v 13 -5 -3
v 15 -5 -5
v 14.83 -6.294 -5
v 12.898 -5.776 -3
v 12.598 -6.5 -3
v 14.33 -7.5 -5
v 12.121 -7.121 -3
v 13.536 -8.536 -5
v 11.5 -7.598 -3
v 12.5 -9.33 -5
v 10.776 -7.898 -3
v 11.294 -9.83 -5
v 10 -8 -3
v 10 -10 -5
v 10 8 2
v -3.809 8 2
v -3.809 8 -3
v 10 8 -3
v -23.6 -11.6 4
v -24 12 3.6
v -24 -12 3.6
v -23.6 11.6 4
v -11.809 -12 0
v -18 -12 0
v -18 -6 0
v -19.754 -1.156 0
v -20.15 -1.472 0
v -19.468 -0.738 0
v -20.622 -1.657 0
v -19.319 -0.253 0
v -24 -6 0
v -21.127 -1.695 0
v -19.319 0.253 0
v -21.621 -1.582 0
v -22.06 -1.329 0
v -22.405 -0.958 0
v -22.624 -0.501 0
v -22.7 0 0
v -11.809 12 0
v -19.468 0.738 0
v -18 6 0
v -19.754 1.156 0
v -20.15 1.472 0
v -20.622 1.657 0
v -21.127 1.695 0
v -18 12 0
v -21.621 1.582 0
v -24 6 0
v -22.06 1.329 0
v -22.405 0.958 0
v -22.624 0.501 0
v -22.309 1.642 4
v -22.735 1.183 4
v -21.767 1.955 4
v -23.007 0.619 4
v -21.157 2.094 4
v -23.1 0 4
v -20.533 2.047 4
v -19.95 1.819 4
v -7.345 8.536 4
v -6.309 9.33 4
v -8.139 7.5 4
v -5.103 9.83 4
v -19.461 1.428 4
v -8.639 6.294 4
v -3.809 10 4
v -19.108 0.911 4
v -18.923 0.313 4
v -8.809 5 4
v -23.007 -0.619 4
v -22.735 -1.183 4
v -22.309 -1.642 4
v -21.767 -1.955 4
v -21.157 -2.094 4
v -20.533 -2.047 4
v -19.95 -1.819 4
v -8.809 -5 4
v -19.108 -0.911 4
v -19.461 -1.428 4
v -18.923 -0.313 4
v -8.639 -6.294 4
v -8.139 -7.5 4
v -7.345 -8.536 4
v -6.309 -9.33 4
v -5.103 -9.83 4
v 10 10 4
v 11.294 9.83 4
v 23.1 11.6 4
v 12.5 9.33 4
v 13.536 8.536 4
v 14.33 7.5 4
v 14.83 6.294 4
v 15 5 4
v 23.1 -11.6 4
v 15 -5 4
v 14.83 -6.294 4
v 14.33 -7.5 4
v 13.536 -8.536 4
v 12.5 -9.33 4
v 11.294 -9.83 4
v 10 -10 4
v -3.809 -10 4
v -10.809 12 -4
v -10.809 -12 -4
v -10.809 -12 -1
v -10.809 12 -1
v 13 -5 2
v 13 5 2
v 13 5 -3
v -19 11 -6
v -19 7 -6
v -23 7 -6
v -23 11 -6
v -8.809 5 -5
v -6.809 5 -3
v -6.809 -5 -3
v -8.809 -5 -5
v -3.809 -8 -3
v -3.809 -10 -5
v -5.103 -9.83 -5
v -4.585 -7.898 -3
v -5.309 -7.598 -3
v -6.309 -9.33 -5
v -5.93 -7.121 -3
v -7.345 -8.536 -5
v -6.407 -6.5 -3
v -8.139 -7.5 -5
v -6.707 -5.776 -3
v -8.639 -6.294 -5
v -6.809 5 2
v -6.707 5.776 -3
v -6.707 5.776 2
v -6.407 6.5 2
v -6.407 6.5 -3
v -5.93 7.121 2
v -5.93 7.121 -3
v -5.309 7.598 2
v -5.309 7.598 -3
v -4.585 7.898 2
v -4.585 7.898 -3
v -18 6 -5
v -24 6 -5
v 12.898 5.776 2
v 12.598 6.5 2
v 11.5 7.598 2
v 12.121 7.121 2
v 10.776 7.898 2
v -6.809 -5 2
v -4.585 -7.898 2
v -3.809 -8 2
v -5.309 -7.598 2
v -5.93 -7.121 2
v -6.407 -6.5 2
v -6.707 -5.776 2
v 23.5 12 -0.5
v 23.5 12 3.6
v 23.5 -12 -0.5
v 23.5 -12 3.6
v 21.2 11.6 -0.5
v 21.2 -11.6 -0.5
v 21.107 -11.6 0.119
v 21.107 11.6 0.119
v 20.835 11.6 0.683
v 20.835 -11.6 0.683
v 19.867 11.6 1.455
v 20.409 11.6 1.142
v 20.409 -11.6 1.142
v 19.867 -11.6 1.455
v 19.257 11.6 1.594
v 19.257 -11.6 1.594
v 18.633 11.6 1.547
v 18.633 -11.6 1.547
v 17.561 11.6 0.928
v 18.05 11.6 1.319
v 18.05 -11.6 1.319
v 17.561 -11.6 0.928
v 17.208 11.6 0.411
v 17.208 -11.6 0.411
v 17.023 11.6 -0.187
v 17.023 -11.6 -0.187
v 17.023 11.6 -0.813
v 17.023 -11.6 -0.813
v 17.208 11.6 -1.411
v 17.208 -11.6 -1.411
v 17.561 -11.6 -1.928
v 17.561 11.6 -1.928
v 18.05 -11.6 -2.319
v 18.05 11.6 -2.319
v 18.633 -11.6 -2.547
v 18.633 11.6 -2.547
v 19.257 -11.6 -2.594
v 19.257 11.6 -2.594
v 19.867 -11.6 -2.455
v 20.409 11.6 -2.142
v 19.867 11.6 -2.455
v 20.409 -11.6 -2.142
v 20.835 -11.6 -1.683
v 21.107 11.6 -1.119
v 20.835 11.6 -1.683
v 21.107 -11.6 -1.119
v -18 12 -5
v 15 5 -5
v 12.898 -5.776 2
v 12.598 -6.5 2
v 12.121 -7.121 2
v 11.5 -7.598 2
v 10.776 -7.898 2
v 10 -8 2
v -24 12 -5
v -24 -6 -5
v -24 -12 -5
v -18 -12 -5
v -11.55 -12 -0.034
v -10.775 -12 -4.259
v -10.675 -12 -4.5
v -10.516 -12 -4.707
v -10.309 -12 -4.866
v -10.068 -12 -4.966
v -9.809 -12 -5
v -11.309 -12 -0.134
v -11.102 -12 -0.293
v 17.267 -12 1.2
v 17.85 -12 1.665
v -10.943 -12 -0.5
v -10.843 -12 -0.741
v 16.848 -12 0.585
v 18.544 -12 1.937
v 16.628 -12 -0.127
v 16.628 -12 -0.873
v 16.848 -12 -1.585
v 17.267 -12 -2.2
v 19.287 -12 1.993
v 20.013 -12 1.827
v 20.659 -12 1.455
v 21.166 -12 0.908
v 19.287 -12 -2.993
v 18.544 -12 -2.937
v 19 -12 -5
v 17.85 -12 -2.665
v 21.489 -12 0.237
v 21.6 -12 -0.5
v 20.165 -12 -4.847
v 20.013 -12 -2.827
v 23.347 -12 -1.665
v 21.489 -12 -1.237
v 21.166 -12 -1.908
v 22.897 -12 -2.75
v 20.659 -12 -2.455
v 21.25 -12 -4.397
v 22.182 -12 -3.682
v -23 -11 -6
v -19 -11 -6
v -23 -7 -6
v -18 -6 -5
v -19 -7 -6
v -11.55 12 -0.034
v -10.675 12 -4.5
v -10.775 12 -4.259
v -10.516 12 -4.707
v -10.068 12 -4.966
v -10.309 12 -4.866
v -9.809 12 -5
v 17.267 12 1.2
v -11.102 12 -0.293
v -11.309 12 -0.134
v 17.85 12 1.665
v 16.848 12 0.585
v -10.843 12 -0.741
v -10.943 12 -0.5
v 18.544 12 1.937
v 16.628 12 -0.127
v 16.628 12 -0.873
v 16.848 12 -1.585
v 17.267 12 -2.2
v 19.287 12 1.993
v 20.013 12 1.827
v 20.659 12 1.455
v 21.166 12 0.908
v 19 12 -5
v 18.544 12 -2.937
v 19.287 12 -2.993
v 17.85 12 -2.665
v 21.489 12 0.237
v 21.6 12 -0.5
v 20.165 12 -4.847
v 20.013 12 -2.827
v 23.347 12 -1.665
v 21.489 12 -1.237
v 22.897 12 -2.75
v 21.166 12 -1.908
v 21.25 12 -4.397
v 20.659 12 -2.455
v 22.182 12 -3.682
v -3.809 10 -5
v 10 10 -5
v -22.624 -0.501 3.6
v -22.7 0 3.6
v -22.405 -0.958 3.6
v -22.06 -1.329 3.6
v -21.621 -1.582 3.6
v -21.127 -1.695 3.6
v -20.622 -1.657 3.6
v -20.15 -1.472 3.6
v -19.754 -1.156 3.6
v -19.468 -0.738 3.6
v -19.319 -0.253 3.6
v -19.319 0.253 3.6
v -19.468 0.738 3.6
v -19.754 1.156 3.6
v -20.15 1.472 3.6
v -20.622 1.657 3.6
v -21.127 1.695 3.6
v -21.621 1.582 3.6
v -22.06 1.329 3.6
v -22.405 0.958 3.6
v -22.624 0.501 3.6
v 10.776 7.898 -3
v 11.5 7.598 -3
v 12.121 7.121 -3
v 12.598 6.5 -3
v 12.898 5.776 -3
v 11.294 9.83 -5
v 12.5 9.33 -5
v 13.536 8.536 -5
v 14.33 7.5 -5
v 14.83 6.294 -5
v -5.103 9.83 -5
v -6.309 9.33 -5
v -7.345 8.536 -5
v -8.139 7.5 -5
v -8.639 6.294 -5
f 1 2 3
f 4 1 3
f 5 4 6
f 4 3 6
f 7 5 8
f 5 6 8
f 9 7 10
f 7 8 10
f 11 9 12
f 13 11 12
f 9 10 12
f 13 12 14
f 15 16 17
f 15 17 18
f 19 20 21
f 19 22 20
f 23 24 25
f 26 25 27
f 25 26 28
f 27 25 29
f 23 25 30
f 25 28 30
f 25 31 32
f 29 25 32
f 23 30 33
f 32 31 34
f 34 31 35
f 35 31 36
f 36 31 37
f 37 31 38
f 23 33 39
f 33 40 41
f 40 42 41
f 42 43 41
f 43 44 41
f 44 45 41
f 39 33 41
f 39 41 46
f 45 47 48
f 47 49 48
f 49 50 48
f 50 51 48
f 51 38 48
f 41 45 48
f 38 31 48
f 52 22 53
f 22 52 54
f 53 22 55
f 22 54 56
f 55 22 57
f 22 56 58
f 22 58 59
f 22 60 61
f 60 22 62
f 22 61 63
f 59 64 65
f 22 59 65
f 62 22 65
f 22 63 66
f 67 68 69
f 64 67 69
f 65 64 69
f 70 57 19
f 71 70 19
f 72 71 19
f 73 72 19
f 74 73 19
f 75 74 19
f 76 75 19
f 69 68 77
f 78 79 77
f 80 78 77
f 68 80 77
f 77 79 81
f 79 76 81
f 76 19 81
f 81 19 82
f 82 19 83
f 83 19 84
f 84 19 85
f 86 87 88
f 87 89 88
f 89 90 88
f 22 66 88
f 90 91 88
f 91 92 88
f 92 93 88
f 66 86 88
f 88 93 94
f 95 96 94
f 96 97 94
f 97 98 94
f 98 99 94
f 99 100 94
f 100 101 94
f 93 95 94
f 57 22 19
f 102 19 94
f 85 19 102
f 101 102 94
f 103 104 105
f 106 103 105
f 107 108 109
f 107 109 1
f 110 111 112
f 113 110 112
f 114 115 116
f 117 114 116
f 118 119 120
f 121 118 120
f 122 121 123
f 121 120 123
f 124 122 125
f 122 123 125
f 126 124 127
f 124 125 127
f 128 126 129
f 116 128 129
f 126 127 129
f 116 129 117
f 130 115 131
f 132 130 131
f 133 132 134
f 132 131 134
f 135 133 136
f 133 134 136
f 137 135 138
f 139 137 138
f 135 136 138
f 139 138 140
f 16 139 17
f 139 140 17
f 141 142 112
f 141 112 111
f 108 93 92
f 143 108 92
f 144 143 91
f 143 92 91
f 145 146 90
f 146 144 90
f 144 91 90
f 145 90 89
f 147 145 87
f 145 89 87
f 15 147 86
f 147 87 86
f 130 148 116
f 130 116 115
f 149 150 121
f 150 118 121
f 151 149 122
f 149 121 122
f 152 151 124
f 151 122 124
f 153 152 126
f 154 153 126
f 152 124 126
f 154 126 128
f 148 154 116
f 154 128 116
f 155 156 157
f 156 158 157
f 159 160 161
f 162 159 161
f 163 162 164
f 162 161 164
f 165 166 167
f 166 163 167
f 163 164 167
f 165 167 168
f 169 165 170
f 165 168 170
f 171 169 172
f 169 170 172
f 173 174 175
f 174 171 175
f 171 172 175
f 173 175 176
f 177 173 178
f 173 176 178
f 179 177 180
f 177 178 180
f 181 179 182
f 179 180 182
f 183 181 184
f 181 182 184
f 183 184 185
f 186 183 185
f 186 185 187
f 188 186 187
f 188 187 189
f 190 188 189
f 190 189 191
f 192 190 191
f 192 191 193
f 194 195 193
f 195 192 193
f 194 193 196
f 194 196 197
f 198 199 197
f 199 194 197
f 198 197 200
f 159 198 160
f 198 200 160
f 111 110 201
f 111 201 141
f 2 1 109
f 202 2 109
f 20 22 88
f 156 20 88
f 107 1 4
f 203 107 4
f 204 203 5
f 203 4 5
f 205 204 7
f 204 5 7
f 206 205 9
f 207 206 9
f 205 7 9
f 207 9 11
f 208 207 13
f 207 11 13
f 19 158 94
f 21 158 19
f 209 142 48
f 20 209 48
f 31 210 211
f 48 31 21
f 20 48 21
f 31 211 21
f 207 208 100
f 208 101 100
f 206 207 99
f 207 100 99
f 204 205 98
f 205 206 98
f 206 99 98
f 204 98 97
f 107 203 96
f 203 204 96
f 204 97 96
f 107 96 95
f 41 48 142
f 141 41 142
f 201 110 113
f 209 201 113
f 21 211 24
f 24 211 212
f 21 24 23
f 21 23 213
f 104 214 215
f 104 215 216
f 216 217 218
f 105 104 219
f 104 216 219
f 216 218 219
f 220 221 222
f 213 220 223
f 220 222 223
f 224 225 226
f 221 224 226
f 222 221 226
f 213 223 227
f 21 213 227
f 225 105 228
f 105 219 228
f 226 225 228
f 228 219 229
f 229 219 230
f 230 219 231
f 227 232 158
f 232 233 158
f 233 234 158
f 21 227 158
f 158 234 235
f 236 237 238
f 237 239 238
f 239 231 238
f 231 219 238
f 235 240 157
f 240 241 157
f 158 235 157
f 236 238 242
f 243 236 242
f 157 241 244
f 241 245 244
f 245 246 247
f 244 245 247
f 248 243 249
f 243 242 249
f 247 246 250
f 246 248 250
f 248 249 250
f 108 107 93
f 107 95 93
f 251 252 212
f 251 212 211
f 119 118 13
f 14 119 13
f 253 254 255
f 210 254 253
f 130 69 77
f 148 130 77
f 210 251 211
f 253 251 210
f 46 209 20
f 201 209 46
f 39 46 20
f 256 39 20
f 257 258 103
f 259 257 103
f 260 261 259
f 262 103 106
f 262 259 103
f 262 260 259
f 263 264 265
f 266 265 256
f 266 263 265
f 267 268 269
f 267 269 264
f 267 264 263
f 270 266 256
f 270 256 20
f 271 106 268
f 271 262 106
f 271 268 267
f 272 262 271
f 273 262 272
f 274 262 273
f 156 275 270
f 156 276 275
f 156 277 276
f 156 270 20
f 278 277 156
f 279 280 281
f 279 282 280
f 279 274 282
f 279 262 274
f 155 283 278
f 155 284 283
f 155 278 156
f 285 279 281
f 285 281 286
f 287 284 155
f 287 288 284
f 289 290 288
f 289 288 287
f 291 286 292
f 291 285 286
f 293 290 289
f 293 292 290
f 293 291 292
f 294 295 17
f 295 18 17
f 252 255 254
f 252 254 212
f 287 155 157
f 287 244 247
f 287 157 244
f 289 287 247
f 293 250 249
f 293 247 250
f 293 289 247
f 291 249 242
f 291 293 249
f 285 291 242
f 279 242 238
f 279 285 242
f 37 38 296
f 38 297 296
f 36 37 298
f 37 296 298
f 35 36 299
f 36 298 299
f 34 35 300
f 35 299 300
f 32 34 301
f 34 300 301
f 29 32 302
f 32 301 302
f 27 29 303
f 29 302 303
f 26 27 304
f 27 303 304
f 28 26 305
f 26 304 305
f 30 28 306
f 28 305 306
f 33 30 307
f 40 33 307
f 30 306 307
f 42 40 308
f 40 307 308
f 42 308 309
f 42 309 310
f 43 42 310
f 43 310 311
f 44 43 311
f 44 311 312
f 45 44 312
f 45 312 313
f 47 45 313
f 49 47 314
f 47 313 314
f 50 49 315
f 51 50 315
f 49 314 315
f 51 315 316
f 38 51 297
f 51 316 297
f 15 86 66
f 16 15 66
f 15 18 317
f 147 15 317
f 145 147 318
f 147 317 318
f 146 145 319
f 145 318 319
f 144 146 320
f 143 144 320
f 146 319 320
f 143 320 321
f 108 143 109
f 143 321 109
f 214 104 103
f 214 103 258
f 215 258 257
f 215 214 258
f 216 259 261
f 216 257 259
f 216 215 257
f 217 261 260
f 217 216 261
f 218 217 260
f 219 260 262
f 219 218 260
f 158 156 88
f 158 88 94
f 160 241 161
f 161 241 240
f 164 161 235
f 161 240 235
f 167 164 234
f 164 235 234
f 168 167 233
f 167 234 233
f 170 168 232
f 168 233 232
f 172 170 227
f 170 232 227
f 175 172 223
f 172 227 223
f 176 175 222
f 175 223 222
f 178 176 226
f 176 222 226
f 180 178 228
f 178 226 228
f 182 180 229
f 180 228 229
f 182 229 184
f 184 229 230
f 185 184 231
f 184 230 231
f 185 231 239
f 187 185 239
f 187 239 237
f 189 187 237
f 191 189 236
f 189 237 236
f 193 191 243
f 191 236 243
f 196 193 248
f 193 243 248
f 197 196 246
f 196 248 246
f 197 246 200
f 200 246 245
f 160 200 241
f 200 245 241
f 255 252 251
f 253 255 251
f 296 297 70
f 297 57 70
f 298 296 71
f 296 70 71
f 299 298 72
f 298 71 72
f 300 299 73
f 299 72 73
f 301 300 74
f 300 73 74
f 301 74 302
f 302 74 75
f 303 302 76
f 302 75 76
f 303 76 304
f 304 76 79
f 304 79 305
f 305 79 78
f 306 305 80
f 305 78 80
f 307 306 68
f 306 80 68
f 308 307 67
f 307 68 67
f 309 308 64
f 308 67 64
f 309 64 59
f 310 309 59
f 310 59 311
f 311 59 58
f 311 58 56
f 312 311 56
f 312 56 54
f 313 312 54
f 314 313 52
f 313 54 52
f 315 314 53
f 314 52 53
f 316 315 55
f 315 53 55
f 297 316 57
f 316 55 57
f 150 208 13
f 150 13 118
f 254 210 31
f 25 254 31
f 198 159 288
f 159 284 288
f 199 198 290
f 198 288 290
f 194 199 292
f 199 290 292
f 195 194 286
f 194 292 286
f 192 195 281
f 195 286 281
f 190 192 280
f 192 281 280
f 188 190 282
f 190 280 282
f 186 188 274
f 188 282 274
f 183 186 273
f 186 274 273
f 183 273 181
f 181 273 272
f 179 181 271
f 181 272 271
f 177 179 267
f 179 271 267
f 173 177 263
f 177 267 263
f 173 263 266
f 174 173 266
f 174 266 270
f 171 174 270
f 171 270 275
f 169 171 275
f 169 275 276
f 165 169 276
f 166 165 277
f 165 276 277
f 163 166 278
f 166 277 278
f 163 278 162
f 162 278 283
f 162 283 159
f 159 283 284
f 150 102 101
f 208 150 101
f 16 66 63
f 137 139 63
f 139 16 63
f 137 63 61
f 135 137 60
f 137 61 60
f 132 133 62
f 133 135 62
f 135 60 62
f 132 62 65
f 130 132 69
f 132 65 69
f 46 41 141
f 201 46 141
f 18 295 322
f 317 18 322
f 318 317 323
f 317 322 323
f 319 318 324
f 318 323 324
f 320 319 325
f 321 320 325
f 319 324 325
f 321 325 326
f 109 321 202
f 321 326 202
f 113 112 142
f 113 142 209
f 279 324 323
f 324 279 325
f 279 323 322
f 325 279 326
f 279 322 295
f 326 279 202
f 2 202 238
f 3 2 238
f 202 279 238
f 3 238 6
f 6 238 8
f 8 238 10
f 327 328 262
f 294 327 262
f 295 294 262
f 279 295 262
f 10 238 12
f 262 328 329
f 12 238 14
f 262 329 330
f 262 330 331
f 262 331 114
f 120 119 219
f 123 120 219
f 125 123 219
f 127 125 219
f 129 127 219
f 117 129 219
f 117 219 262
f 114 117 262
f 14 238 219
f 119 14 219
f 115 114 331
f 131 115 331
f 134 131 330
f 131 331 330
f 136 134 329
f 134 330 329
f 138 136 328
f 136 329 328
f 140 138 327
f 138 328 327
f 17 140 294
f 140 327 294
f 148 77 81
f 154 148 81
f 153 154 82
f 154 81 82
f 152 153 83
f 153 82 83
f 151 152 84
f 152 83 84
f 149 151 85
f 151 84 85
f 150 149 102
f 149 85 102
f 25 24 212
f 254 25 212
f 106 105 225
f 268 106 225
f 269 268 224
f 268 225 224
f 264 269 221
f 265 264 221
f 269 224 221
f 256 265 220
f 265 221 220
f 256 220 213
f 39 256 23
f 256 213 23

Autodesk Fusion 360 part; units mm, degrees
sketch "Sketch1" plane through (0, 0, 0) normal (0, 1, 0) x (1, 0, 0) in component "bowen_retainer"
  line L0 (-24, -4) -> (23.5, -4)
  line L1 (23.5, -4) -> (23.5, 5)
  line L2 (23.5, 5) -> (-10.809, 5)
  line L3 (-10.809, 5) -> (-10.809, 0)
  line L4 (-10.809, 0) -> (-18, 0)
  line L5 (-18, 0) -> (-18, 6)
  line L6 (-18, 6) -> (-24, 6)
  line L7 (-24, 6) -> (-24, -4)
  circle A0 centre (19.1, 0.5) radius 2.1
  line L8 (23.5, 0.5) -> (19.1, 0.5) construction
  point P0 (23.5, 0.5)
  dimension "d17" = 47.5
  dimension "d18" = 6
  dimension "d19" = 6
  dimension "d22" = 9
  dimension "d23" = 4.2
  dimension "d24" = 4.4
extrude "Extrude1" add sketch "Sketch1" along normal mid plane 24 in component "bowen_retainer"
sketch "Sketch2" plane through (0, 0, 4) normal (0, 0, 1) x (-1, 0, 0) in component "bowen_retainer"
  line L0 (-23.5, 12) -> (-23.5, -12)
  line L1 (-23.5, -12) -> (24, -12)
  line L2 (24, -12) -> (24, 12)
  line L3 (24, 12) -> (-23.5, 12)
  circle A0 centre (21, 0) radius 1.7
  line L4 (24, 12) -> (24, -12)
  line L5 (24, -12) -> (18, -12)
  line L6 (18, -12) -> (18, 12)
  line L7 (18, 12) -> (24, 12)
  line L8 (24, -12) -> (18, 12) construction
  line L9 (24, 12) -> (18, -12) construction
  line L10 (6.809, -8) -> (-13, -8)
  line L11 (-13, -8) -> (-13, 8)
  line L12 (-13, 8) -> (6.809, 8)
  line L13 (6.809, 8) -> (6.809, -8)
  line L14 (10.809, 12) -> (10.809, -12)
  line L15 (10.809, -12) -> (-23.5, -12)
  line L16 (-23.5, -12) -> (-23.5, 12)
  line L17 (-23.5, 12) -> (10.809, 12)
  point P0 (21, 0)
  dimension "d27" = 3.4
  dimension "d28" = 4
  dimension "d29" = 4
  dimension "d30" = 10.5
  dimension "d31" = 4
extrude "Extrude2" cut sketch "Sketch2" against normal through all contours A0 | L10 L11 L12 L13 in component "bowen_retainer"
sketch "Sketch3" plane through (-24, 0, 0) normal (-1, 0, 0) x (0, -1, 0) in component "bowen_retainer"
  line L0 (12, 4) -> (-12, 4)
  line L1 (-12, 4) -> (-12, -6)
  line L2 (-12, -6) -> (12, -6)
  line L3 (12, -6) -> (12, 4)
  line L4 (-6, -6) -> (6, -6)
  line L5 (6, -6) -> (6, 0)
  line L6 (6, 0) -> (-6, 0)
  line L7 (-6, 0) -> (-6, -6)
  line L8 (12, 0) -> (-12, 0)
  line L9 (-12, 0) -> (-12, -5)
  line L10 (-12, -5) -> (12, -5)
  line L11 (12, -5) -> (12, 0)
  dimension "d33" = 6
extrude "Extrude3" cut sketch "Sketch3" against normal up to surface (6 mm away) contours L5 L6 L7 L8 L10 | L2 L4 L5 L7 L10 in component "bowen_retainer"
fillet "Fillet1" radius 4.5 1 edges at (23.5, 0, -5) in component "bowen_retainer"
fillet "Fillet2" radius 3 4 edges at (-6.809, 8, -0.5) (13, 8, -0.5) (13, -8, -0.5) (-6.809, -8, -0.5) in component "bowen_retainer"
chamfer "Chamfer1" distance 2 angle 45 16 edges at (-5.9304, 7.1213, 4) (-6.809, 0, 4) (-5.9304, -7.1213, 4) (3.0955, -8, 4) (12.1213, -7.1213, 4) (13, 0, 4) (12.1213, 7.1213, 4) (3.0955, 8, 4) (-6.809, 0, -5) (-5.9304, -7.1213, -5) (3.0955, -8, -5) (12.1213, -7.1213, -5) (13, 0, -5) (12.1213, 7.1213, -5) (3.0955, 8, -5) (-5.9304, 7.1213, -5) in component "bowen_retainer"
fillet "Fillet3" radius 1 2 edges at (-10.809, 0, 0) (-10.809, 0, -5) in component "bowen_retainer"
chamfer "Chamfer2" distance 1 angle 45 2 edges at (-24, 9, -6) (-21, 12, -6) 2 faces at (-20, 8, -6) (-20, -8, -6) in component "bowen_retainer"
chamfer "Chamfer3" distance 0.4 angle 45 7 edges at (-19.415, -0.6147, 4) (17.1421, -12, 0.2594) (17.1421, 12, -1.2594) (-0.25, 12, 4) (23.5, 0, 4) (-0.25, -12, 4) (-24, 0, 4) in component "bowen_retainer"
component "bowen_retainer" placed x (1, 0, 0) y (0, 1, 0) z (0, 0, 1) at (0, 0, 0)
equation "ptfe_tube_od = 4 mm"
equation "tolerance = 0.2 mm"
equation "extrusion_width = 20 mm"
equation "width = 24 mm"
equation "length = 47.5 mm"
equation "arm_width = 4 mm"
equation "extrusion_slot_width = 6 mm"
equation "d17 = length"
equation "d18 = extrusion_slot_width"
equation "d19 = extrusion_slot_depth"
equation "extrusion_slot_depth = 6 mm"
equation "depth = 9 mm"
equation "d22 = depth"
equation "d23 = ptfe_tube_od + tolerance"
equation "d25 = width"
equation "d28 = arm_width"
equation "d29 = arm_width"
equation "d33 = extrusion_slot_depth"
